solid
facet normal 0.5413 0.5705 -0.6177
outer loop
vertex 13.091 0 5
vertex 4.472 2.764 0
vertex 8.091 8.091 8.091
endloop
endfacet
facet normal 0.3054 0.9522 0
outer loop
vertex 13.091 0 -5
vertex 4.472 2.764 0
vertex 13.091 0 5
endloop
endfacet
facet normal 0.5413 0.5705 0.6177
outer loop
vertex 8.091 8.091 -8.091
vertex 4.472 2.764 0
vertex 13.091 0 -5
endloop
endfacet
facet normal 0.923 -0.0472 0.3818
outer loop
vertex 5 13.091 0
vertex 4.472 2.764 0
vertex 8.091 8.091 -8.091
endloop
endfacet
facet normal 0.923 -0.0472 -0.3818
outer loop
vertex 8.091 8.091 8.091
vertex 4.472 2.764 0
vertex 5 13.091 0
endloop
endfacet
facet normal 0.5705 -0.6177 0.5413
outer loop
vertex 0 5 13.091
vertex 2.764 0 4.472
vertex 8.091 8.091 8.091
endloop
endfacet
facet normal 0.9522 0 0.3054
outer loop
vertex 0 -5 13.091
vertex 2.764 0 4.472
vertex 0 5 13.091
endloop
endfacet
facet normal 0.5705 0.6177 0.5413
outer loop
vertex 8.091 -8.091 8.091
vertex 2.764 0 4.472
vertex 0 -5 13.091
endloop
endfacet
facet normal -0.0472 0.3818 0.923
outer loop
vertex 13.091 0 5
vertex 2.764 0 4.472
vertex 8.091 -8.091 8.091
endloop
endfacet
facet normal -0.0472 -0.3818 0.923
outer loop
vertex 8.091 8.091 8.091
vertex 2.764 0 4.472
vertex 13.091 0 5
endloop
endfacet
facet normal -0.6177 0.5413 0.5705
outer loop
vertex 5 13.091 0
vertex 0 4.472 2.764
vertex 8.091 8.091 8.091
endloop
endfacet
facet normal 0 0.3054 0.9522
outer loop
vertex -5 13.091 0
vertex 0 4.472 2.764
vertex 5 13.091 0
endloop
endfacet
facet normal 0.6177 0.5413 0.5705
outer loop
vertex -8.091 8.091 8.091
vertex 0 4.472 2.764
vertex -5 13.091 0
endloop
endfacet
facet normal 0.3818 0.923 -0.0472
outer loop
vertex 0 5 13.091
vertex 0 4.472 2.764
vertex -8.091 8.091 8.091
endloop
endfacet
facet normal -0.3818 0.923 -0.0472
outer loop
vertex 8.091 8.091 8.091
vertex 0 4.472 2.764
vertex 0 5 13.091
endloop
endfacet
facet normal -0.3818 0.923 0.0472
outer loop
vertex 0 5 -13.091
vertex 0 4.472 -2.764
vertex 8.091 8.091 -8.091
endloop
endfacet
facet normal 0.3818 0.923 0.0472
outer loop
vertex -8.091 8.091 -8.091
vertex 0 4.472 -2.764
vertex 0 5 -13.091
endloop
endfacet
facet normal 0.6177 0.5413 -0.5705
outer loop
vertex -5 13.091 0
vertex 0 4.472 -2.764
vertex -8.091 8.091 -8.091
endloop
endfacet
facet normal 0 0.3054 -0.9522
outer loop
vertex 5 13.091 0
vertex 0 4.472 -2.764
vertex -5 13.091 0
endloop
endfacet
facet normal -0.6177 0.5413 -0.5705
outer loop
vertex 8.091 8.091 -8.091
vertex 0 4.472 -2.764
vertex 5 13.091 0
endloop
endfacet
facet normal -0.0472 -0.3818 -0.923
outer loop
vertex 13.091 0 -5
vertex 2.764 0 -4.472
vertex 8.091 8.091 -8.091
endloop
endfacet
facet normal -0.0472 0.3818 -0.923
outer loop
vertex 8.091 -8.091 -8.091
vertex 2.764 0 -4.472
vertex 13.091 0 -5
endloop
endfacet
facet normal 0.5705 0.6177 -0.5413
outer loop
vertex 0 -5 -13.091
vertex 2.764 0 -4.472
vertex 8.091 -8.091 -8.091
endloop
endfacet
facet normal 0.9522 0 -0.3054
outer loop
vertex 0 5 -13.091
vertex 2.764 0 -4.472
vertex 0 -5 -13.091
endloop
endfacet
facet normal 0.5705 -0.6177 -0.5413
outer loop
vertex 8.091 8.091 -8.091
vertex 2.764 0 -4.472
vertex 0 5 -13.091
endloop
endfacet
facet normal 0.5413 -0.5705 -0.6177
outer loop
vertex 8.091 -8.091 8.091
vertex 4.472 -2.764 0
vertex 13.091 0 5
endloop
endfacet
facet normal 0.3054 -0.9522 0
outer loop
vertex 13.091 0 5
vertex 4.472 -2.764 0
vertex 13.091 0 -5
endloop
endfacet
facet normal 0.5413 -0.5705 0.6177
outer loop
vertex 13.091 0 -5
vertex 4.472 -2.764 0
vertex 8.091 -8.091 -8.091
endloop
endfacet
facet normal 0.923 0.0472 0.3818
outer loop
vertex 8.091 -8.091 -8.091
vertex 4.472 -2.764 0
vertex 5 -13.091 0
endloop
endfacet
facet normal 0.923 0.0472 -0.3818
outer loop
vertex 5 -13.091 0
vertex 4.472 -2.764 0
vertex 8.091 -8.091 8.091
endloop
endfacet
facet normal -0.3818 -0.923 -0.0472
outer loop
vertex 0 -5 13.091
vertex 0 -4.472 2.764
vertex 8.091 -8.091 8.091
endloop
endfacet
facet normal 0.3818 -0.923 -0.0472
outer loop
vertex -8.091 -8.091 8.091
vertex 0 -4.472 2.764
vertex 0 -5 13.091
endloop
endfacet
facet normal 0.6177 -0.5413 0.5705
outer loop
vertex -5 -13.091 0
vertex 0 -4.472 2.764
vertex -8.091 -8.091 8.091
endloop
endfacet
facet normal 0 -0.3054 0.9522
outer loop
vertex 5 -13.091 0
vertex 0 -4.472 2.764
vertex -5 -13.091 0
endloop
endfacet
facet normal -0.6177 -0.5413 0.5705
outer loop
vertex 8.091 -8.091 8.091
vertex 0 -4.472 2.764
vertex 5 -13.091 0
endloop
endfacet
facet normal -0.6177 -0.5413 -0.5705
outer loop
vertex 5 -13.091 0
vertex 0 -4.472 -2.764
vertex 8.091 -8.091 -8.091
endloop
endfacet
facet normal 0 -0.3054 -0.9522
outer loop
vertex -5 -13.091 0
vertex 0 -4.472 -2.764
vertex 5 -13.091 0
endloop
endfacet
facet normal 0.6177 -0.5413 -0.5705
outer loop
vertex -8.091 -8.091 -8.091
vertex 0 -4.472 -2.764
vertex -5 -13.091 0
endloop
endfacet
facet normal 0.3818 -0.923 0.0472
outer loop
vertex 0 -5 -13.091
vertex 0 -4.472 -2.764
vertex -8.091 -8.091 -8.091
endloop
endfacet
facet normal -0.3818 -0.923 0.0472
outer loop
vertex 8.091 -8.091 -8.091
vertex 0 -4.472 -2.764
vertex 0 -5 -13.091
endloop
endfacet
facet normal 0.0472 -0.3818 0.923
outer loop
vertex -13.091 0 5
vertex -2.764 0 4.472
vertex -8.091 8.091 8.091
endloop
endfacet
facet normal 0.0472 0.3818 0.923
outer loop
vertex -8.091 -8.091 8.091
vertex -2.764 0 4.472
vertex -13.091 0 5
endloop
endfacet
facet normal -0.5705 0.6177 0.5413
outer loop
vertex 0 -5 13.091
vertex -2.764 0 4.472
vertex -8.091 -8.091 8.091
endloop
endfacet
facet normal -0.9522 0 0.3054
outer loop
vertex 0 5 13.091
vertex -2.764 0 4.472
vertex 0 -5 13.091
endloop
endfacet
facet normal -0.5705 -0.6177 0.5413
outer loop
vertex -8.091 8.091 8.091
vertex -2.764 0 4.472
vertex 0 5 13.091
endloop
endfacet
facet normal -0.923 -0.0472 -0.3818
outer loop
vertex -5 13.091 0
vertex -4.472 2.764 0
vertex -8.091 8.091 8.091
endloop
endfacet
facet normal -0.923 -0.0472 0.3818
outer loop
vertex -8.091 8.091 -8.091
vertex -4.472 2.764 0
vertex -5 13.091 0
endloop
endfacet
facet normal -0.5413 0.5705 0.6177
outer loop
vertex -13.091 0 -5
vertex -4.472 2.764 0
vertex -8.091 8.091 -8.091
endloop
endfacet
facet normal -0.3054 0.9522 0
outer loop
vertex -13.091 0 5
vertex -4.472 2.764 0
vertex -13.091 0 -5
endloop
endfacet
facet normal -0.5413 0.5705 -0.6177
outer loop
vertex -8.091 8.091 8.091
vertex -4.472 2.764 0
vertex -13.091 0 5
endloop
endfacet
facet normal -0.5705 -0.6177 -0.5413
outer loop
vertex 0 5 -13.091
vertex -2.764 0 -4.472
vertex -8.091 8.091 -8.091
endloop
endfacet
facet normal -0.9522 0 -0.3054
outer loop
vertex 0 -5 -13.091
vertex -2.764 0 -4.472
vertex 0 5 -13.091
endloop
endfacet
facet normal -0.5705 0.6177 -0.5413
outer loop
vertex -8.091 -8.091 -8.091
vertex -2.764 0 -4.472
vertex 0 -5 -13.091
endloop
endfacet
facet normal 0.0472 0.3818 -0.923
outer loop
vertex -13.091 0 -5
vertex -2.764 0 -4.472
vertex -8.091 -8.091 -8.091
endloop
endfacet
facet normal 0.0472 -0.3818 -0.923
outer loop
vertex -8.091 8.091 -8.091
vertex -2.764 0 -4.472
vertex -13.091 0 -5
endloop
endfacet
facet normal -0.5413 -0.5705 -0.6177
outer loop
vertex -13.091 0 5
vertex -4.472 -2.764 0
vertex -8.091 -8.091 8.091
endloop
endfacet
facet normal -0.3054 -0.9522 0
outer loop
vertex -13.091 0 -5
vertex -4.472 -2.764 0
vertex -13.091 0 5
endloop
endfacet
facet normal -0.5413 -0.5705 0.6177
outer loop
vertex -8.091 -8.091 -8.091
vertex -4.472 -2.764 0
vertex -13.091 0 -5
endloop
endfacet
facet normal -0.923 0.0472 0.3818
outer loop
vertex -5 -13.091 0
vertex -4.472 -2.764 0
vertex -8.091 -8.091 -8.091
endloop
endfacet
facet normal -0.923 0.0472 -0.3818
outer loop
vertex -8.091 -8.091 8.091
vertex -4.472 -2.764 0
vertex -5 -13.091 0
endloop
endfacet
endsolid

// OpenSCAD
arete = 10;
creux = 0; // creux ou plein || 1 ou 0
paroi = 1.5;
echelleReductionAjustementBouchon = 0.985;
bouchon = 0; // 1 ou 0
corps = 1; // 1 ou 0

// Controle rotation viewport quand animation en route
$vpr = [70, 0, $t * 180];

/* Forme
Choix parmi:
- 0 => Etoilé
- 1 => Christique
- 2 => Christique_inversé
- 3 => Pentakis // (all points on sphere)
- 4 => Animate // voir plus bas pour plus d'infos
*/
forme_ID = 4;

/////////

function dodeca_ext_radius(a) = 
    a/2*(sqrt(2));
    
function dodeca_sphere_inscrite_radius(a) = 
    a*sqrt(5/8+11/(8*sqrt(5)));
    
function dodeca_arete_from_cercle_inscrite(radius) = 
    radius/sqrt(5/8+11/(8*sqrt(5)));    

spike = [
    2.3417, // Etoilé, scale 1 is arete = 1.236 mm, diametre = 6.24 mm, arete pyramide = 2 mm
    0.8944, // Christique, scale 1 is arete = 1.236 mm, diametre = 4.05 mm
    -0.8944, // Christique inversé
    0.4279 // Pentakis
];

if (forme_ID == 4) {
    Animate();
} else {  
    if (creux == 0) {
        small_stellated_dodecahedron(spike[forme_ID], small_stellated_dodecahedron);
    } else {
        if (corps == 1) {
            corps_ouvert();
        }
        if (bouchon == 1) {
            bouchon();
        }
    }
}


//		poly_creux();
//		decoupe_bouchon();

module corps_ouvert() {
	difference() {
		poly_creux();
		decoupe_bouchon();
	}
}

module poly_creux() {
    areteInt = dodeca_arete_from_cercle_inscrite(dodeca_sphere_inscrite_radius(arete)-paroi);
                         
    echo(areteInt);
    
    difference() {
        small_stellated_dodecahedron(arete, spike[forme_ID]);
        small_stellated_dodecahedron(areteInt, spike[forme_ID]);
    }
}

module decoupe_bouchon(scale=1) {
    distance = dodeca_sphere_inscrite_radius(arete);
	rotate([0,0,36]) translate([0,0, distance])
		cylinder(99, r=arete*0.853, $fn=5, center=false);
	rotate([0,0,36]) translate([0,0, distance-paroi])
		cylinder(paroi, r=(arete-paroi)*0.85*scale, $fn=5, center=false);
}

module supplement_feuillure_bouchon() {
    distance = dodeca_sphere_inscrite_radius(arete);
    rotate([0,0,36]) translate([0,0, distance-paroi-1])
    difference() {   
		cylinder(paroi+1, r=(arete-paroi)*0.85, $fn=5, center=false);
		cylinder(paroi+1, r=(arete-2*paroi)*0.85, $fn=5, center=false);
    }
}

module bouchon() {
//	scale([echelleReductionAjustementBouchon, echelleReductionAjustementBouchon, 0.995])
	difference () {
        intersection() {
            union() {
                poly_creux();
                supplement_feuillure_bouchon();
            }
            decoupe_bouchon(echelleReductionAjustementBouchon);
        }
	}
}

// }}

/*
animates the single parameter of the
module small_stellated_dodecahedron

1/ choose animate in the view menu
2/ sets fps to an appropiate number for
your machine - 20 is good
3/ set steps to a number that keeps the
change from happening too slowly or
too fast - 200 is good
*/
module Animate() {
    small_stellated_dodecahedron(-3.4317*abs(2*$t-1)+2.4317);
}

// Étoilé
// scale 1 is arete = 1.236 mm, diametre = 6.24 mm, arete pyramide = 2 mm
module Etoile(a) {
    small_stellated_dodecahedron(2.3417, a);
}

// Christique
// scale 1 is arete = 1.236 mm, diametre = 4.05 mm
module Christique(a) {
    small_stellated_dodecahedron(0.8944, a);
}

// Christique inversé
module Christique_inv(a) {
    small_stellated_dodecahedron(-0.8944, a);
}

// Pentakis (all points on sphere)
module Pentakis(a) {
    small_stellated_dodecahedron(0.4279, a);
}

module small_stellated_dodecahedron(scale, ar)
{
a=scale*0.61803;
b=scale*0.38197;
    
length = ar ? ar : arete;
echo(length);
// scale(1) => arete 1.236 mm
scale(length/1.236)

// Posé sur 3 pointes
//rotate([20.91, 0, 0])

// Posé sur 1 pointe
//rotate([0, 31.72, 0])

/*
constructed from 12 pentagonal pyramids placed
on the faces of a dodecahedron.
first 20 points are the vertices of a dodecahedron
next 12 points are the vertices of the centers
of the faces of the dodecahedron

if scale = 0 a dodecahedron is created

if scale is positive the centers of the
faces are moved out fron the center of the
dodecahedron

if scale is negative the centers of the
faces are moved in towards the center of the
dodecahedron

the apex angles of the triangles that make up
the faces of the stellated dodecahedron
are 36 degrees - the scale factor that
makes a small stellated dodecahedron
is approximately 2.3417
length of side of pentagonal pyramid for
small stellated dodecahedron = 2

the apex angles of the triangles that make up
the faces of a pentakis dodecahedron ( one of
the Catalan solids) are about 68.619 degrees
the scale factor to make one is ca 0.4279

if len = length of the sides of the
pentagonal pyramid then approximately

scale = + or - sqrt((len*len/0.52786) - 2.09443)

lengths of the sides of the base are sqrt(5)-1
or 1.23607 to make equilateral triangles scale
factor is 0.8944

distance from centers of faces to origin ca 1.37638
distance from dodecahedral points to origin sqrt(3)




pcm

*/

polyhedron
       (points = [
                 [   1.00000,   1.00000,   1.00000],
                 [   1.00000,   1.00000,  -1.00000],
                 [   1.00000,  -1.00000,   1.00000],
                 [   1.00000,  -1.00000,  -1.00000],
                 [  -1.00000,   1.00000,   1.00000],
                 [  -1.00000,   1.00000,  -1.00000],
                 [  -1.00000,  -1.00000,   1.00000],
                 [  -1.00000,  -1.00000,  -1.00000],
                 [   0.00000,   0.61803,   1.61803],
                 [   0.00000,   0.61803,  -1.61803],
                 [   0.00000,  -0.61803,   1.61803],
                 [   0.00000,  -0.61803,  -1.61803],
                 [   0.61803,   1.61803,   0.00000],
                 [   0.61803,  -1.61803,   0.00000],
                 [  -0.61803,   1.61803,   0.00000],
                 [  -0.61803,  -1.61803,   0.00000],
                 [   1.61803,   0.00000,   0.61803],
                 [   1.61803,   0.00000,  -0.61803],
                 [  -1.61803,   0.00000,   0.61803],
                 [  -1.61803,   0.00000,  -0.61803],
                 [   1.17082+a,   0.72361+b,   0.00000],
                 [   0.72361+b,   0.00000,   1.17082+a],
                 [   0.00000,   1.17082+a,   0.72361+b],
                 [   0.00000,   1.17082+a,  -0.72361-b],
                 [   0.72361+b,   0.00000,  -1.17082-a],
                 [   1.17082+a,  -0.72361-b,   0.00000],
                 [   0.00000,  -1.17082-a,   0.72361+b],
                 [   0.00000,  -1.17082-a,  -0.72361-b],
                 [  -0.72361-b,   0.00000,   1.17082+a],
                 [  -1.17082-a,   0.72361+b,   0.00000],
                 [  -0.72361-b,   0.00000,  -1.17082-a],
                 [  -1.17082-a,  -0.72361-b,   0.00000],
                   ],

           faces = [

                [0,20,16],[16,20,17],[17,20,1],
                [1,20,12],[12,20,0],
                [0,21,8],[8,21,10],[10,21,2],
                [2,21,16],[16,21,0],
                 [0,22,12],[12,22,14],[14,22,4],
                [4,22,8],[8,22,0],
                [1,23,9],[9,23,5],[5,23,14],
                [14,23,12],[12,23,1],
                [1,24,17],[17,24,3],[3,24,11],
                [11,24,9],[9,24,1],
                [16,25,2],[17,25,16],[3,25,17],
                 [13,25,3],[2,25,13],
                 [2,26,10],[10,26,6],[6,26,15],
                 [15,26,13],[13,26,2],
                 [3,27,13],[13,27,15],[15,27,7],
                 [7,27,11],[11,27,3],
                [4,28,18],[18,28,6],[6,28,10],
                 [10,28,8],[8,28,4],
                 [4,29,14],[14,29,5],[5,29,19],
                 [19,29,18],[18,29,4],
                  [5,30,9],[9,30,11],[11,30,7],
                 [7,30,19],[19,30,5],
                 [6,31,18],[18,31,19],[19,31,7],
                 [7,31,15],[15,31,6],

                 ]
      );
}
